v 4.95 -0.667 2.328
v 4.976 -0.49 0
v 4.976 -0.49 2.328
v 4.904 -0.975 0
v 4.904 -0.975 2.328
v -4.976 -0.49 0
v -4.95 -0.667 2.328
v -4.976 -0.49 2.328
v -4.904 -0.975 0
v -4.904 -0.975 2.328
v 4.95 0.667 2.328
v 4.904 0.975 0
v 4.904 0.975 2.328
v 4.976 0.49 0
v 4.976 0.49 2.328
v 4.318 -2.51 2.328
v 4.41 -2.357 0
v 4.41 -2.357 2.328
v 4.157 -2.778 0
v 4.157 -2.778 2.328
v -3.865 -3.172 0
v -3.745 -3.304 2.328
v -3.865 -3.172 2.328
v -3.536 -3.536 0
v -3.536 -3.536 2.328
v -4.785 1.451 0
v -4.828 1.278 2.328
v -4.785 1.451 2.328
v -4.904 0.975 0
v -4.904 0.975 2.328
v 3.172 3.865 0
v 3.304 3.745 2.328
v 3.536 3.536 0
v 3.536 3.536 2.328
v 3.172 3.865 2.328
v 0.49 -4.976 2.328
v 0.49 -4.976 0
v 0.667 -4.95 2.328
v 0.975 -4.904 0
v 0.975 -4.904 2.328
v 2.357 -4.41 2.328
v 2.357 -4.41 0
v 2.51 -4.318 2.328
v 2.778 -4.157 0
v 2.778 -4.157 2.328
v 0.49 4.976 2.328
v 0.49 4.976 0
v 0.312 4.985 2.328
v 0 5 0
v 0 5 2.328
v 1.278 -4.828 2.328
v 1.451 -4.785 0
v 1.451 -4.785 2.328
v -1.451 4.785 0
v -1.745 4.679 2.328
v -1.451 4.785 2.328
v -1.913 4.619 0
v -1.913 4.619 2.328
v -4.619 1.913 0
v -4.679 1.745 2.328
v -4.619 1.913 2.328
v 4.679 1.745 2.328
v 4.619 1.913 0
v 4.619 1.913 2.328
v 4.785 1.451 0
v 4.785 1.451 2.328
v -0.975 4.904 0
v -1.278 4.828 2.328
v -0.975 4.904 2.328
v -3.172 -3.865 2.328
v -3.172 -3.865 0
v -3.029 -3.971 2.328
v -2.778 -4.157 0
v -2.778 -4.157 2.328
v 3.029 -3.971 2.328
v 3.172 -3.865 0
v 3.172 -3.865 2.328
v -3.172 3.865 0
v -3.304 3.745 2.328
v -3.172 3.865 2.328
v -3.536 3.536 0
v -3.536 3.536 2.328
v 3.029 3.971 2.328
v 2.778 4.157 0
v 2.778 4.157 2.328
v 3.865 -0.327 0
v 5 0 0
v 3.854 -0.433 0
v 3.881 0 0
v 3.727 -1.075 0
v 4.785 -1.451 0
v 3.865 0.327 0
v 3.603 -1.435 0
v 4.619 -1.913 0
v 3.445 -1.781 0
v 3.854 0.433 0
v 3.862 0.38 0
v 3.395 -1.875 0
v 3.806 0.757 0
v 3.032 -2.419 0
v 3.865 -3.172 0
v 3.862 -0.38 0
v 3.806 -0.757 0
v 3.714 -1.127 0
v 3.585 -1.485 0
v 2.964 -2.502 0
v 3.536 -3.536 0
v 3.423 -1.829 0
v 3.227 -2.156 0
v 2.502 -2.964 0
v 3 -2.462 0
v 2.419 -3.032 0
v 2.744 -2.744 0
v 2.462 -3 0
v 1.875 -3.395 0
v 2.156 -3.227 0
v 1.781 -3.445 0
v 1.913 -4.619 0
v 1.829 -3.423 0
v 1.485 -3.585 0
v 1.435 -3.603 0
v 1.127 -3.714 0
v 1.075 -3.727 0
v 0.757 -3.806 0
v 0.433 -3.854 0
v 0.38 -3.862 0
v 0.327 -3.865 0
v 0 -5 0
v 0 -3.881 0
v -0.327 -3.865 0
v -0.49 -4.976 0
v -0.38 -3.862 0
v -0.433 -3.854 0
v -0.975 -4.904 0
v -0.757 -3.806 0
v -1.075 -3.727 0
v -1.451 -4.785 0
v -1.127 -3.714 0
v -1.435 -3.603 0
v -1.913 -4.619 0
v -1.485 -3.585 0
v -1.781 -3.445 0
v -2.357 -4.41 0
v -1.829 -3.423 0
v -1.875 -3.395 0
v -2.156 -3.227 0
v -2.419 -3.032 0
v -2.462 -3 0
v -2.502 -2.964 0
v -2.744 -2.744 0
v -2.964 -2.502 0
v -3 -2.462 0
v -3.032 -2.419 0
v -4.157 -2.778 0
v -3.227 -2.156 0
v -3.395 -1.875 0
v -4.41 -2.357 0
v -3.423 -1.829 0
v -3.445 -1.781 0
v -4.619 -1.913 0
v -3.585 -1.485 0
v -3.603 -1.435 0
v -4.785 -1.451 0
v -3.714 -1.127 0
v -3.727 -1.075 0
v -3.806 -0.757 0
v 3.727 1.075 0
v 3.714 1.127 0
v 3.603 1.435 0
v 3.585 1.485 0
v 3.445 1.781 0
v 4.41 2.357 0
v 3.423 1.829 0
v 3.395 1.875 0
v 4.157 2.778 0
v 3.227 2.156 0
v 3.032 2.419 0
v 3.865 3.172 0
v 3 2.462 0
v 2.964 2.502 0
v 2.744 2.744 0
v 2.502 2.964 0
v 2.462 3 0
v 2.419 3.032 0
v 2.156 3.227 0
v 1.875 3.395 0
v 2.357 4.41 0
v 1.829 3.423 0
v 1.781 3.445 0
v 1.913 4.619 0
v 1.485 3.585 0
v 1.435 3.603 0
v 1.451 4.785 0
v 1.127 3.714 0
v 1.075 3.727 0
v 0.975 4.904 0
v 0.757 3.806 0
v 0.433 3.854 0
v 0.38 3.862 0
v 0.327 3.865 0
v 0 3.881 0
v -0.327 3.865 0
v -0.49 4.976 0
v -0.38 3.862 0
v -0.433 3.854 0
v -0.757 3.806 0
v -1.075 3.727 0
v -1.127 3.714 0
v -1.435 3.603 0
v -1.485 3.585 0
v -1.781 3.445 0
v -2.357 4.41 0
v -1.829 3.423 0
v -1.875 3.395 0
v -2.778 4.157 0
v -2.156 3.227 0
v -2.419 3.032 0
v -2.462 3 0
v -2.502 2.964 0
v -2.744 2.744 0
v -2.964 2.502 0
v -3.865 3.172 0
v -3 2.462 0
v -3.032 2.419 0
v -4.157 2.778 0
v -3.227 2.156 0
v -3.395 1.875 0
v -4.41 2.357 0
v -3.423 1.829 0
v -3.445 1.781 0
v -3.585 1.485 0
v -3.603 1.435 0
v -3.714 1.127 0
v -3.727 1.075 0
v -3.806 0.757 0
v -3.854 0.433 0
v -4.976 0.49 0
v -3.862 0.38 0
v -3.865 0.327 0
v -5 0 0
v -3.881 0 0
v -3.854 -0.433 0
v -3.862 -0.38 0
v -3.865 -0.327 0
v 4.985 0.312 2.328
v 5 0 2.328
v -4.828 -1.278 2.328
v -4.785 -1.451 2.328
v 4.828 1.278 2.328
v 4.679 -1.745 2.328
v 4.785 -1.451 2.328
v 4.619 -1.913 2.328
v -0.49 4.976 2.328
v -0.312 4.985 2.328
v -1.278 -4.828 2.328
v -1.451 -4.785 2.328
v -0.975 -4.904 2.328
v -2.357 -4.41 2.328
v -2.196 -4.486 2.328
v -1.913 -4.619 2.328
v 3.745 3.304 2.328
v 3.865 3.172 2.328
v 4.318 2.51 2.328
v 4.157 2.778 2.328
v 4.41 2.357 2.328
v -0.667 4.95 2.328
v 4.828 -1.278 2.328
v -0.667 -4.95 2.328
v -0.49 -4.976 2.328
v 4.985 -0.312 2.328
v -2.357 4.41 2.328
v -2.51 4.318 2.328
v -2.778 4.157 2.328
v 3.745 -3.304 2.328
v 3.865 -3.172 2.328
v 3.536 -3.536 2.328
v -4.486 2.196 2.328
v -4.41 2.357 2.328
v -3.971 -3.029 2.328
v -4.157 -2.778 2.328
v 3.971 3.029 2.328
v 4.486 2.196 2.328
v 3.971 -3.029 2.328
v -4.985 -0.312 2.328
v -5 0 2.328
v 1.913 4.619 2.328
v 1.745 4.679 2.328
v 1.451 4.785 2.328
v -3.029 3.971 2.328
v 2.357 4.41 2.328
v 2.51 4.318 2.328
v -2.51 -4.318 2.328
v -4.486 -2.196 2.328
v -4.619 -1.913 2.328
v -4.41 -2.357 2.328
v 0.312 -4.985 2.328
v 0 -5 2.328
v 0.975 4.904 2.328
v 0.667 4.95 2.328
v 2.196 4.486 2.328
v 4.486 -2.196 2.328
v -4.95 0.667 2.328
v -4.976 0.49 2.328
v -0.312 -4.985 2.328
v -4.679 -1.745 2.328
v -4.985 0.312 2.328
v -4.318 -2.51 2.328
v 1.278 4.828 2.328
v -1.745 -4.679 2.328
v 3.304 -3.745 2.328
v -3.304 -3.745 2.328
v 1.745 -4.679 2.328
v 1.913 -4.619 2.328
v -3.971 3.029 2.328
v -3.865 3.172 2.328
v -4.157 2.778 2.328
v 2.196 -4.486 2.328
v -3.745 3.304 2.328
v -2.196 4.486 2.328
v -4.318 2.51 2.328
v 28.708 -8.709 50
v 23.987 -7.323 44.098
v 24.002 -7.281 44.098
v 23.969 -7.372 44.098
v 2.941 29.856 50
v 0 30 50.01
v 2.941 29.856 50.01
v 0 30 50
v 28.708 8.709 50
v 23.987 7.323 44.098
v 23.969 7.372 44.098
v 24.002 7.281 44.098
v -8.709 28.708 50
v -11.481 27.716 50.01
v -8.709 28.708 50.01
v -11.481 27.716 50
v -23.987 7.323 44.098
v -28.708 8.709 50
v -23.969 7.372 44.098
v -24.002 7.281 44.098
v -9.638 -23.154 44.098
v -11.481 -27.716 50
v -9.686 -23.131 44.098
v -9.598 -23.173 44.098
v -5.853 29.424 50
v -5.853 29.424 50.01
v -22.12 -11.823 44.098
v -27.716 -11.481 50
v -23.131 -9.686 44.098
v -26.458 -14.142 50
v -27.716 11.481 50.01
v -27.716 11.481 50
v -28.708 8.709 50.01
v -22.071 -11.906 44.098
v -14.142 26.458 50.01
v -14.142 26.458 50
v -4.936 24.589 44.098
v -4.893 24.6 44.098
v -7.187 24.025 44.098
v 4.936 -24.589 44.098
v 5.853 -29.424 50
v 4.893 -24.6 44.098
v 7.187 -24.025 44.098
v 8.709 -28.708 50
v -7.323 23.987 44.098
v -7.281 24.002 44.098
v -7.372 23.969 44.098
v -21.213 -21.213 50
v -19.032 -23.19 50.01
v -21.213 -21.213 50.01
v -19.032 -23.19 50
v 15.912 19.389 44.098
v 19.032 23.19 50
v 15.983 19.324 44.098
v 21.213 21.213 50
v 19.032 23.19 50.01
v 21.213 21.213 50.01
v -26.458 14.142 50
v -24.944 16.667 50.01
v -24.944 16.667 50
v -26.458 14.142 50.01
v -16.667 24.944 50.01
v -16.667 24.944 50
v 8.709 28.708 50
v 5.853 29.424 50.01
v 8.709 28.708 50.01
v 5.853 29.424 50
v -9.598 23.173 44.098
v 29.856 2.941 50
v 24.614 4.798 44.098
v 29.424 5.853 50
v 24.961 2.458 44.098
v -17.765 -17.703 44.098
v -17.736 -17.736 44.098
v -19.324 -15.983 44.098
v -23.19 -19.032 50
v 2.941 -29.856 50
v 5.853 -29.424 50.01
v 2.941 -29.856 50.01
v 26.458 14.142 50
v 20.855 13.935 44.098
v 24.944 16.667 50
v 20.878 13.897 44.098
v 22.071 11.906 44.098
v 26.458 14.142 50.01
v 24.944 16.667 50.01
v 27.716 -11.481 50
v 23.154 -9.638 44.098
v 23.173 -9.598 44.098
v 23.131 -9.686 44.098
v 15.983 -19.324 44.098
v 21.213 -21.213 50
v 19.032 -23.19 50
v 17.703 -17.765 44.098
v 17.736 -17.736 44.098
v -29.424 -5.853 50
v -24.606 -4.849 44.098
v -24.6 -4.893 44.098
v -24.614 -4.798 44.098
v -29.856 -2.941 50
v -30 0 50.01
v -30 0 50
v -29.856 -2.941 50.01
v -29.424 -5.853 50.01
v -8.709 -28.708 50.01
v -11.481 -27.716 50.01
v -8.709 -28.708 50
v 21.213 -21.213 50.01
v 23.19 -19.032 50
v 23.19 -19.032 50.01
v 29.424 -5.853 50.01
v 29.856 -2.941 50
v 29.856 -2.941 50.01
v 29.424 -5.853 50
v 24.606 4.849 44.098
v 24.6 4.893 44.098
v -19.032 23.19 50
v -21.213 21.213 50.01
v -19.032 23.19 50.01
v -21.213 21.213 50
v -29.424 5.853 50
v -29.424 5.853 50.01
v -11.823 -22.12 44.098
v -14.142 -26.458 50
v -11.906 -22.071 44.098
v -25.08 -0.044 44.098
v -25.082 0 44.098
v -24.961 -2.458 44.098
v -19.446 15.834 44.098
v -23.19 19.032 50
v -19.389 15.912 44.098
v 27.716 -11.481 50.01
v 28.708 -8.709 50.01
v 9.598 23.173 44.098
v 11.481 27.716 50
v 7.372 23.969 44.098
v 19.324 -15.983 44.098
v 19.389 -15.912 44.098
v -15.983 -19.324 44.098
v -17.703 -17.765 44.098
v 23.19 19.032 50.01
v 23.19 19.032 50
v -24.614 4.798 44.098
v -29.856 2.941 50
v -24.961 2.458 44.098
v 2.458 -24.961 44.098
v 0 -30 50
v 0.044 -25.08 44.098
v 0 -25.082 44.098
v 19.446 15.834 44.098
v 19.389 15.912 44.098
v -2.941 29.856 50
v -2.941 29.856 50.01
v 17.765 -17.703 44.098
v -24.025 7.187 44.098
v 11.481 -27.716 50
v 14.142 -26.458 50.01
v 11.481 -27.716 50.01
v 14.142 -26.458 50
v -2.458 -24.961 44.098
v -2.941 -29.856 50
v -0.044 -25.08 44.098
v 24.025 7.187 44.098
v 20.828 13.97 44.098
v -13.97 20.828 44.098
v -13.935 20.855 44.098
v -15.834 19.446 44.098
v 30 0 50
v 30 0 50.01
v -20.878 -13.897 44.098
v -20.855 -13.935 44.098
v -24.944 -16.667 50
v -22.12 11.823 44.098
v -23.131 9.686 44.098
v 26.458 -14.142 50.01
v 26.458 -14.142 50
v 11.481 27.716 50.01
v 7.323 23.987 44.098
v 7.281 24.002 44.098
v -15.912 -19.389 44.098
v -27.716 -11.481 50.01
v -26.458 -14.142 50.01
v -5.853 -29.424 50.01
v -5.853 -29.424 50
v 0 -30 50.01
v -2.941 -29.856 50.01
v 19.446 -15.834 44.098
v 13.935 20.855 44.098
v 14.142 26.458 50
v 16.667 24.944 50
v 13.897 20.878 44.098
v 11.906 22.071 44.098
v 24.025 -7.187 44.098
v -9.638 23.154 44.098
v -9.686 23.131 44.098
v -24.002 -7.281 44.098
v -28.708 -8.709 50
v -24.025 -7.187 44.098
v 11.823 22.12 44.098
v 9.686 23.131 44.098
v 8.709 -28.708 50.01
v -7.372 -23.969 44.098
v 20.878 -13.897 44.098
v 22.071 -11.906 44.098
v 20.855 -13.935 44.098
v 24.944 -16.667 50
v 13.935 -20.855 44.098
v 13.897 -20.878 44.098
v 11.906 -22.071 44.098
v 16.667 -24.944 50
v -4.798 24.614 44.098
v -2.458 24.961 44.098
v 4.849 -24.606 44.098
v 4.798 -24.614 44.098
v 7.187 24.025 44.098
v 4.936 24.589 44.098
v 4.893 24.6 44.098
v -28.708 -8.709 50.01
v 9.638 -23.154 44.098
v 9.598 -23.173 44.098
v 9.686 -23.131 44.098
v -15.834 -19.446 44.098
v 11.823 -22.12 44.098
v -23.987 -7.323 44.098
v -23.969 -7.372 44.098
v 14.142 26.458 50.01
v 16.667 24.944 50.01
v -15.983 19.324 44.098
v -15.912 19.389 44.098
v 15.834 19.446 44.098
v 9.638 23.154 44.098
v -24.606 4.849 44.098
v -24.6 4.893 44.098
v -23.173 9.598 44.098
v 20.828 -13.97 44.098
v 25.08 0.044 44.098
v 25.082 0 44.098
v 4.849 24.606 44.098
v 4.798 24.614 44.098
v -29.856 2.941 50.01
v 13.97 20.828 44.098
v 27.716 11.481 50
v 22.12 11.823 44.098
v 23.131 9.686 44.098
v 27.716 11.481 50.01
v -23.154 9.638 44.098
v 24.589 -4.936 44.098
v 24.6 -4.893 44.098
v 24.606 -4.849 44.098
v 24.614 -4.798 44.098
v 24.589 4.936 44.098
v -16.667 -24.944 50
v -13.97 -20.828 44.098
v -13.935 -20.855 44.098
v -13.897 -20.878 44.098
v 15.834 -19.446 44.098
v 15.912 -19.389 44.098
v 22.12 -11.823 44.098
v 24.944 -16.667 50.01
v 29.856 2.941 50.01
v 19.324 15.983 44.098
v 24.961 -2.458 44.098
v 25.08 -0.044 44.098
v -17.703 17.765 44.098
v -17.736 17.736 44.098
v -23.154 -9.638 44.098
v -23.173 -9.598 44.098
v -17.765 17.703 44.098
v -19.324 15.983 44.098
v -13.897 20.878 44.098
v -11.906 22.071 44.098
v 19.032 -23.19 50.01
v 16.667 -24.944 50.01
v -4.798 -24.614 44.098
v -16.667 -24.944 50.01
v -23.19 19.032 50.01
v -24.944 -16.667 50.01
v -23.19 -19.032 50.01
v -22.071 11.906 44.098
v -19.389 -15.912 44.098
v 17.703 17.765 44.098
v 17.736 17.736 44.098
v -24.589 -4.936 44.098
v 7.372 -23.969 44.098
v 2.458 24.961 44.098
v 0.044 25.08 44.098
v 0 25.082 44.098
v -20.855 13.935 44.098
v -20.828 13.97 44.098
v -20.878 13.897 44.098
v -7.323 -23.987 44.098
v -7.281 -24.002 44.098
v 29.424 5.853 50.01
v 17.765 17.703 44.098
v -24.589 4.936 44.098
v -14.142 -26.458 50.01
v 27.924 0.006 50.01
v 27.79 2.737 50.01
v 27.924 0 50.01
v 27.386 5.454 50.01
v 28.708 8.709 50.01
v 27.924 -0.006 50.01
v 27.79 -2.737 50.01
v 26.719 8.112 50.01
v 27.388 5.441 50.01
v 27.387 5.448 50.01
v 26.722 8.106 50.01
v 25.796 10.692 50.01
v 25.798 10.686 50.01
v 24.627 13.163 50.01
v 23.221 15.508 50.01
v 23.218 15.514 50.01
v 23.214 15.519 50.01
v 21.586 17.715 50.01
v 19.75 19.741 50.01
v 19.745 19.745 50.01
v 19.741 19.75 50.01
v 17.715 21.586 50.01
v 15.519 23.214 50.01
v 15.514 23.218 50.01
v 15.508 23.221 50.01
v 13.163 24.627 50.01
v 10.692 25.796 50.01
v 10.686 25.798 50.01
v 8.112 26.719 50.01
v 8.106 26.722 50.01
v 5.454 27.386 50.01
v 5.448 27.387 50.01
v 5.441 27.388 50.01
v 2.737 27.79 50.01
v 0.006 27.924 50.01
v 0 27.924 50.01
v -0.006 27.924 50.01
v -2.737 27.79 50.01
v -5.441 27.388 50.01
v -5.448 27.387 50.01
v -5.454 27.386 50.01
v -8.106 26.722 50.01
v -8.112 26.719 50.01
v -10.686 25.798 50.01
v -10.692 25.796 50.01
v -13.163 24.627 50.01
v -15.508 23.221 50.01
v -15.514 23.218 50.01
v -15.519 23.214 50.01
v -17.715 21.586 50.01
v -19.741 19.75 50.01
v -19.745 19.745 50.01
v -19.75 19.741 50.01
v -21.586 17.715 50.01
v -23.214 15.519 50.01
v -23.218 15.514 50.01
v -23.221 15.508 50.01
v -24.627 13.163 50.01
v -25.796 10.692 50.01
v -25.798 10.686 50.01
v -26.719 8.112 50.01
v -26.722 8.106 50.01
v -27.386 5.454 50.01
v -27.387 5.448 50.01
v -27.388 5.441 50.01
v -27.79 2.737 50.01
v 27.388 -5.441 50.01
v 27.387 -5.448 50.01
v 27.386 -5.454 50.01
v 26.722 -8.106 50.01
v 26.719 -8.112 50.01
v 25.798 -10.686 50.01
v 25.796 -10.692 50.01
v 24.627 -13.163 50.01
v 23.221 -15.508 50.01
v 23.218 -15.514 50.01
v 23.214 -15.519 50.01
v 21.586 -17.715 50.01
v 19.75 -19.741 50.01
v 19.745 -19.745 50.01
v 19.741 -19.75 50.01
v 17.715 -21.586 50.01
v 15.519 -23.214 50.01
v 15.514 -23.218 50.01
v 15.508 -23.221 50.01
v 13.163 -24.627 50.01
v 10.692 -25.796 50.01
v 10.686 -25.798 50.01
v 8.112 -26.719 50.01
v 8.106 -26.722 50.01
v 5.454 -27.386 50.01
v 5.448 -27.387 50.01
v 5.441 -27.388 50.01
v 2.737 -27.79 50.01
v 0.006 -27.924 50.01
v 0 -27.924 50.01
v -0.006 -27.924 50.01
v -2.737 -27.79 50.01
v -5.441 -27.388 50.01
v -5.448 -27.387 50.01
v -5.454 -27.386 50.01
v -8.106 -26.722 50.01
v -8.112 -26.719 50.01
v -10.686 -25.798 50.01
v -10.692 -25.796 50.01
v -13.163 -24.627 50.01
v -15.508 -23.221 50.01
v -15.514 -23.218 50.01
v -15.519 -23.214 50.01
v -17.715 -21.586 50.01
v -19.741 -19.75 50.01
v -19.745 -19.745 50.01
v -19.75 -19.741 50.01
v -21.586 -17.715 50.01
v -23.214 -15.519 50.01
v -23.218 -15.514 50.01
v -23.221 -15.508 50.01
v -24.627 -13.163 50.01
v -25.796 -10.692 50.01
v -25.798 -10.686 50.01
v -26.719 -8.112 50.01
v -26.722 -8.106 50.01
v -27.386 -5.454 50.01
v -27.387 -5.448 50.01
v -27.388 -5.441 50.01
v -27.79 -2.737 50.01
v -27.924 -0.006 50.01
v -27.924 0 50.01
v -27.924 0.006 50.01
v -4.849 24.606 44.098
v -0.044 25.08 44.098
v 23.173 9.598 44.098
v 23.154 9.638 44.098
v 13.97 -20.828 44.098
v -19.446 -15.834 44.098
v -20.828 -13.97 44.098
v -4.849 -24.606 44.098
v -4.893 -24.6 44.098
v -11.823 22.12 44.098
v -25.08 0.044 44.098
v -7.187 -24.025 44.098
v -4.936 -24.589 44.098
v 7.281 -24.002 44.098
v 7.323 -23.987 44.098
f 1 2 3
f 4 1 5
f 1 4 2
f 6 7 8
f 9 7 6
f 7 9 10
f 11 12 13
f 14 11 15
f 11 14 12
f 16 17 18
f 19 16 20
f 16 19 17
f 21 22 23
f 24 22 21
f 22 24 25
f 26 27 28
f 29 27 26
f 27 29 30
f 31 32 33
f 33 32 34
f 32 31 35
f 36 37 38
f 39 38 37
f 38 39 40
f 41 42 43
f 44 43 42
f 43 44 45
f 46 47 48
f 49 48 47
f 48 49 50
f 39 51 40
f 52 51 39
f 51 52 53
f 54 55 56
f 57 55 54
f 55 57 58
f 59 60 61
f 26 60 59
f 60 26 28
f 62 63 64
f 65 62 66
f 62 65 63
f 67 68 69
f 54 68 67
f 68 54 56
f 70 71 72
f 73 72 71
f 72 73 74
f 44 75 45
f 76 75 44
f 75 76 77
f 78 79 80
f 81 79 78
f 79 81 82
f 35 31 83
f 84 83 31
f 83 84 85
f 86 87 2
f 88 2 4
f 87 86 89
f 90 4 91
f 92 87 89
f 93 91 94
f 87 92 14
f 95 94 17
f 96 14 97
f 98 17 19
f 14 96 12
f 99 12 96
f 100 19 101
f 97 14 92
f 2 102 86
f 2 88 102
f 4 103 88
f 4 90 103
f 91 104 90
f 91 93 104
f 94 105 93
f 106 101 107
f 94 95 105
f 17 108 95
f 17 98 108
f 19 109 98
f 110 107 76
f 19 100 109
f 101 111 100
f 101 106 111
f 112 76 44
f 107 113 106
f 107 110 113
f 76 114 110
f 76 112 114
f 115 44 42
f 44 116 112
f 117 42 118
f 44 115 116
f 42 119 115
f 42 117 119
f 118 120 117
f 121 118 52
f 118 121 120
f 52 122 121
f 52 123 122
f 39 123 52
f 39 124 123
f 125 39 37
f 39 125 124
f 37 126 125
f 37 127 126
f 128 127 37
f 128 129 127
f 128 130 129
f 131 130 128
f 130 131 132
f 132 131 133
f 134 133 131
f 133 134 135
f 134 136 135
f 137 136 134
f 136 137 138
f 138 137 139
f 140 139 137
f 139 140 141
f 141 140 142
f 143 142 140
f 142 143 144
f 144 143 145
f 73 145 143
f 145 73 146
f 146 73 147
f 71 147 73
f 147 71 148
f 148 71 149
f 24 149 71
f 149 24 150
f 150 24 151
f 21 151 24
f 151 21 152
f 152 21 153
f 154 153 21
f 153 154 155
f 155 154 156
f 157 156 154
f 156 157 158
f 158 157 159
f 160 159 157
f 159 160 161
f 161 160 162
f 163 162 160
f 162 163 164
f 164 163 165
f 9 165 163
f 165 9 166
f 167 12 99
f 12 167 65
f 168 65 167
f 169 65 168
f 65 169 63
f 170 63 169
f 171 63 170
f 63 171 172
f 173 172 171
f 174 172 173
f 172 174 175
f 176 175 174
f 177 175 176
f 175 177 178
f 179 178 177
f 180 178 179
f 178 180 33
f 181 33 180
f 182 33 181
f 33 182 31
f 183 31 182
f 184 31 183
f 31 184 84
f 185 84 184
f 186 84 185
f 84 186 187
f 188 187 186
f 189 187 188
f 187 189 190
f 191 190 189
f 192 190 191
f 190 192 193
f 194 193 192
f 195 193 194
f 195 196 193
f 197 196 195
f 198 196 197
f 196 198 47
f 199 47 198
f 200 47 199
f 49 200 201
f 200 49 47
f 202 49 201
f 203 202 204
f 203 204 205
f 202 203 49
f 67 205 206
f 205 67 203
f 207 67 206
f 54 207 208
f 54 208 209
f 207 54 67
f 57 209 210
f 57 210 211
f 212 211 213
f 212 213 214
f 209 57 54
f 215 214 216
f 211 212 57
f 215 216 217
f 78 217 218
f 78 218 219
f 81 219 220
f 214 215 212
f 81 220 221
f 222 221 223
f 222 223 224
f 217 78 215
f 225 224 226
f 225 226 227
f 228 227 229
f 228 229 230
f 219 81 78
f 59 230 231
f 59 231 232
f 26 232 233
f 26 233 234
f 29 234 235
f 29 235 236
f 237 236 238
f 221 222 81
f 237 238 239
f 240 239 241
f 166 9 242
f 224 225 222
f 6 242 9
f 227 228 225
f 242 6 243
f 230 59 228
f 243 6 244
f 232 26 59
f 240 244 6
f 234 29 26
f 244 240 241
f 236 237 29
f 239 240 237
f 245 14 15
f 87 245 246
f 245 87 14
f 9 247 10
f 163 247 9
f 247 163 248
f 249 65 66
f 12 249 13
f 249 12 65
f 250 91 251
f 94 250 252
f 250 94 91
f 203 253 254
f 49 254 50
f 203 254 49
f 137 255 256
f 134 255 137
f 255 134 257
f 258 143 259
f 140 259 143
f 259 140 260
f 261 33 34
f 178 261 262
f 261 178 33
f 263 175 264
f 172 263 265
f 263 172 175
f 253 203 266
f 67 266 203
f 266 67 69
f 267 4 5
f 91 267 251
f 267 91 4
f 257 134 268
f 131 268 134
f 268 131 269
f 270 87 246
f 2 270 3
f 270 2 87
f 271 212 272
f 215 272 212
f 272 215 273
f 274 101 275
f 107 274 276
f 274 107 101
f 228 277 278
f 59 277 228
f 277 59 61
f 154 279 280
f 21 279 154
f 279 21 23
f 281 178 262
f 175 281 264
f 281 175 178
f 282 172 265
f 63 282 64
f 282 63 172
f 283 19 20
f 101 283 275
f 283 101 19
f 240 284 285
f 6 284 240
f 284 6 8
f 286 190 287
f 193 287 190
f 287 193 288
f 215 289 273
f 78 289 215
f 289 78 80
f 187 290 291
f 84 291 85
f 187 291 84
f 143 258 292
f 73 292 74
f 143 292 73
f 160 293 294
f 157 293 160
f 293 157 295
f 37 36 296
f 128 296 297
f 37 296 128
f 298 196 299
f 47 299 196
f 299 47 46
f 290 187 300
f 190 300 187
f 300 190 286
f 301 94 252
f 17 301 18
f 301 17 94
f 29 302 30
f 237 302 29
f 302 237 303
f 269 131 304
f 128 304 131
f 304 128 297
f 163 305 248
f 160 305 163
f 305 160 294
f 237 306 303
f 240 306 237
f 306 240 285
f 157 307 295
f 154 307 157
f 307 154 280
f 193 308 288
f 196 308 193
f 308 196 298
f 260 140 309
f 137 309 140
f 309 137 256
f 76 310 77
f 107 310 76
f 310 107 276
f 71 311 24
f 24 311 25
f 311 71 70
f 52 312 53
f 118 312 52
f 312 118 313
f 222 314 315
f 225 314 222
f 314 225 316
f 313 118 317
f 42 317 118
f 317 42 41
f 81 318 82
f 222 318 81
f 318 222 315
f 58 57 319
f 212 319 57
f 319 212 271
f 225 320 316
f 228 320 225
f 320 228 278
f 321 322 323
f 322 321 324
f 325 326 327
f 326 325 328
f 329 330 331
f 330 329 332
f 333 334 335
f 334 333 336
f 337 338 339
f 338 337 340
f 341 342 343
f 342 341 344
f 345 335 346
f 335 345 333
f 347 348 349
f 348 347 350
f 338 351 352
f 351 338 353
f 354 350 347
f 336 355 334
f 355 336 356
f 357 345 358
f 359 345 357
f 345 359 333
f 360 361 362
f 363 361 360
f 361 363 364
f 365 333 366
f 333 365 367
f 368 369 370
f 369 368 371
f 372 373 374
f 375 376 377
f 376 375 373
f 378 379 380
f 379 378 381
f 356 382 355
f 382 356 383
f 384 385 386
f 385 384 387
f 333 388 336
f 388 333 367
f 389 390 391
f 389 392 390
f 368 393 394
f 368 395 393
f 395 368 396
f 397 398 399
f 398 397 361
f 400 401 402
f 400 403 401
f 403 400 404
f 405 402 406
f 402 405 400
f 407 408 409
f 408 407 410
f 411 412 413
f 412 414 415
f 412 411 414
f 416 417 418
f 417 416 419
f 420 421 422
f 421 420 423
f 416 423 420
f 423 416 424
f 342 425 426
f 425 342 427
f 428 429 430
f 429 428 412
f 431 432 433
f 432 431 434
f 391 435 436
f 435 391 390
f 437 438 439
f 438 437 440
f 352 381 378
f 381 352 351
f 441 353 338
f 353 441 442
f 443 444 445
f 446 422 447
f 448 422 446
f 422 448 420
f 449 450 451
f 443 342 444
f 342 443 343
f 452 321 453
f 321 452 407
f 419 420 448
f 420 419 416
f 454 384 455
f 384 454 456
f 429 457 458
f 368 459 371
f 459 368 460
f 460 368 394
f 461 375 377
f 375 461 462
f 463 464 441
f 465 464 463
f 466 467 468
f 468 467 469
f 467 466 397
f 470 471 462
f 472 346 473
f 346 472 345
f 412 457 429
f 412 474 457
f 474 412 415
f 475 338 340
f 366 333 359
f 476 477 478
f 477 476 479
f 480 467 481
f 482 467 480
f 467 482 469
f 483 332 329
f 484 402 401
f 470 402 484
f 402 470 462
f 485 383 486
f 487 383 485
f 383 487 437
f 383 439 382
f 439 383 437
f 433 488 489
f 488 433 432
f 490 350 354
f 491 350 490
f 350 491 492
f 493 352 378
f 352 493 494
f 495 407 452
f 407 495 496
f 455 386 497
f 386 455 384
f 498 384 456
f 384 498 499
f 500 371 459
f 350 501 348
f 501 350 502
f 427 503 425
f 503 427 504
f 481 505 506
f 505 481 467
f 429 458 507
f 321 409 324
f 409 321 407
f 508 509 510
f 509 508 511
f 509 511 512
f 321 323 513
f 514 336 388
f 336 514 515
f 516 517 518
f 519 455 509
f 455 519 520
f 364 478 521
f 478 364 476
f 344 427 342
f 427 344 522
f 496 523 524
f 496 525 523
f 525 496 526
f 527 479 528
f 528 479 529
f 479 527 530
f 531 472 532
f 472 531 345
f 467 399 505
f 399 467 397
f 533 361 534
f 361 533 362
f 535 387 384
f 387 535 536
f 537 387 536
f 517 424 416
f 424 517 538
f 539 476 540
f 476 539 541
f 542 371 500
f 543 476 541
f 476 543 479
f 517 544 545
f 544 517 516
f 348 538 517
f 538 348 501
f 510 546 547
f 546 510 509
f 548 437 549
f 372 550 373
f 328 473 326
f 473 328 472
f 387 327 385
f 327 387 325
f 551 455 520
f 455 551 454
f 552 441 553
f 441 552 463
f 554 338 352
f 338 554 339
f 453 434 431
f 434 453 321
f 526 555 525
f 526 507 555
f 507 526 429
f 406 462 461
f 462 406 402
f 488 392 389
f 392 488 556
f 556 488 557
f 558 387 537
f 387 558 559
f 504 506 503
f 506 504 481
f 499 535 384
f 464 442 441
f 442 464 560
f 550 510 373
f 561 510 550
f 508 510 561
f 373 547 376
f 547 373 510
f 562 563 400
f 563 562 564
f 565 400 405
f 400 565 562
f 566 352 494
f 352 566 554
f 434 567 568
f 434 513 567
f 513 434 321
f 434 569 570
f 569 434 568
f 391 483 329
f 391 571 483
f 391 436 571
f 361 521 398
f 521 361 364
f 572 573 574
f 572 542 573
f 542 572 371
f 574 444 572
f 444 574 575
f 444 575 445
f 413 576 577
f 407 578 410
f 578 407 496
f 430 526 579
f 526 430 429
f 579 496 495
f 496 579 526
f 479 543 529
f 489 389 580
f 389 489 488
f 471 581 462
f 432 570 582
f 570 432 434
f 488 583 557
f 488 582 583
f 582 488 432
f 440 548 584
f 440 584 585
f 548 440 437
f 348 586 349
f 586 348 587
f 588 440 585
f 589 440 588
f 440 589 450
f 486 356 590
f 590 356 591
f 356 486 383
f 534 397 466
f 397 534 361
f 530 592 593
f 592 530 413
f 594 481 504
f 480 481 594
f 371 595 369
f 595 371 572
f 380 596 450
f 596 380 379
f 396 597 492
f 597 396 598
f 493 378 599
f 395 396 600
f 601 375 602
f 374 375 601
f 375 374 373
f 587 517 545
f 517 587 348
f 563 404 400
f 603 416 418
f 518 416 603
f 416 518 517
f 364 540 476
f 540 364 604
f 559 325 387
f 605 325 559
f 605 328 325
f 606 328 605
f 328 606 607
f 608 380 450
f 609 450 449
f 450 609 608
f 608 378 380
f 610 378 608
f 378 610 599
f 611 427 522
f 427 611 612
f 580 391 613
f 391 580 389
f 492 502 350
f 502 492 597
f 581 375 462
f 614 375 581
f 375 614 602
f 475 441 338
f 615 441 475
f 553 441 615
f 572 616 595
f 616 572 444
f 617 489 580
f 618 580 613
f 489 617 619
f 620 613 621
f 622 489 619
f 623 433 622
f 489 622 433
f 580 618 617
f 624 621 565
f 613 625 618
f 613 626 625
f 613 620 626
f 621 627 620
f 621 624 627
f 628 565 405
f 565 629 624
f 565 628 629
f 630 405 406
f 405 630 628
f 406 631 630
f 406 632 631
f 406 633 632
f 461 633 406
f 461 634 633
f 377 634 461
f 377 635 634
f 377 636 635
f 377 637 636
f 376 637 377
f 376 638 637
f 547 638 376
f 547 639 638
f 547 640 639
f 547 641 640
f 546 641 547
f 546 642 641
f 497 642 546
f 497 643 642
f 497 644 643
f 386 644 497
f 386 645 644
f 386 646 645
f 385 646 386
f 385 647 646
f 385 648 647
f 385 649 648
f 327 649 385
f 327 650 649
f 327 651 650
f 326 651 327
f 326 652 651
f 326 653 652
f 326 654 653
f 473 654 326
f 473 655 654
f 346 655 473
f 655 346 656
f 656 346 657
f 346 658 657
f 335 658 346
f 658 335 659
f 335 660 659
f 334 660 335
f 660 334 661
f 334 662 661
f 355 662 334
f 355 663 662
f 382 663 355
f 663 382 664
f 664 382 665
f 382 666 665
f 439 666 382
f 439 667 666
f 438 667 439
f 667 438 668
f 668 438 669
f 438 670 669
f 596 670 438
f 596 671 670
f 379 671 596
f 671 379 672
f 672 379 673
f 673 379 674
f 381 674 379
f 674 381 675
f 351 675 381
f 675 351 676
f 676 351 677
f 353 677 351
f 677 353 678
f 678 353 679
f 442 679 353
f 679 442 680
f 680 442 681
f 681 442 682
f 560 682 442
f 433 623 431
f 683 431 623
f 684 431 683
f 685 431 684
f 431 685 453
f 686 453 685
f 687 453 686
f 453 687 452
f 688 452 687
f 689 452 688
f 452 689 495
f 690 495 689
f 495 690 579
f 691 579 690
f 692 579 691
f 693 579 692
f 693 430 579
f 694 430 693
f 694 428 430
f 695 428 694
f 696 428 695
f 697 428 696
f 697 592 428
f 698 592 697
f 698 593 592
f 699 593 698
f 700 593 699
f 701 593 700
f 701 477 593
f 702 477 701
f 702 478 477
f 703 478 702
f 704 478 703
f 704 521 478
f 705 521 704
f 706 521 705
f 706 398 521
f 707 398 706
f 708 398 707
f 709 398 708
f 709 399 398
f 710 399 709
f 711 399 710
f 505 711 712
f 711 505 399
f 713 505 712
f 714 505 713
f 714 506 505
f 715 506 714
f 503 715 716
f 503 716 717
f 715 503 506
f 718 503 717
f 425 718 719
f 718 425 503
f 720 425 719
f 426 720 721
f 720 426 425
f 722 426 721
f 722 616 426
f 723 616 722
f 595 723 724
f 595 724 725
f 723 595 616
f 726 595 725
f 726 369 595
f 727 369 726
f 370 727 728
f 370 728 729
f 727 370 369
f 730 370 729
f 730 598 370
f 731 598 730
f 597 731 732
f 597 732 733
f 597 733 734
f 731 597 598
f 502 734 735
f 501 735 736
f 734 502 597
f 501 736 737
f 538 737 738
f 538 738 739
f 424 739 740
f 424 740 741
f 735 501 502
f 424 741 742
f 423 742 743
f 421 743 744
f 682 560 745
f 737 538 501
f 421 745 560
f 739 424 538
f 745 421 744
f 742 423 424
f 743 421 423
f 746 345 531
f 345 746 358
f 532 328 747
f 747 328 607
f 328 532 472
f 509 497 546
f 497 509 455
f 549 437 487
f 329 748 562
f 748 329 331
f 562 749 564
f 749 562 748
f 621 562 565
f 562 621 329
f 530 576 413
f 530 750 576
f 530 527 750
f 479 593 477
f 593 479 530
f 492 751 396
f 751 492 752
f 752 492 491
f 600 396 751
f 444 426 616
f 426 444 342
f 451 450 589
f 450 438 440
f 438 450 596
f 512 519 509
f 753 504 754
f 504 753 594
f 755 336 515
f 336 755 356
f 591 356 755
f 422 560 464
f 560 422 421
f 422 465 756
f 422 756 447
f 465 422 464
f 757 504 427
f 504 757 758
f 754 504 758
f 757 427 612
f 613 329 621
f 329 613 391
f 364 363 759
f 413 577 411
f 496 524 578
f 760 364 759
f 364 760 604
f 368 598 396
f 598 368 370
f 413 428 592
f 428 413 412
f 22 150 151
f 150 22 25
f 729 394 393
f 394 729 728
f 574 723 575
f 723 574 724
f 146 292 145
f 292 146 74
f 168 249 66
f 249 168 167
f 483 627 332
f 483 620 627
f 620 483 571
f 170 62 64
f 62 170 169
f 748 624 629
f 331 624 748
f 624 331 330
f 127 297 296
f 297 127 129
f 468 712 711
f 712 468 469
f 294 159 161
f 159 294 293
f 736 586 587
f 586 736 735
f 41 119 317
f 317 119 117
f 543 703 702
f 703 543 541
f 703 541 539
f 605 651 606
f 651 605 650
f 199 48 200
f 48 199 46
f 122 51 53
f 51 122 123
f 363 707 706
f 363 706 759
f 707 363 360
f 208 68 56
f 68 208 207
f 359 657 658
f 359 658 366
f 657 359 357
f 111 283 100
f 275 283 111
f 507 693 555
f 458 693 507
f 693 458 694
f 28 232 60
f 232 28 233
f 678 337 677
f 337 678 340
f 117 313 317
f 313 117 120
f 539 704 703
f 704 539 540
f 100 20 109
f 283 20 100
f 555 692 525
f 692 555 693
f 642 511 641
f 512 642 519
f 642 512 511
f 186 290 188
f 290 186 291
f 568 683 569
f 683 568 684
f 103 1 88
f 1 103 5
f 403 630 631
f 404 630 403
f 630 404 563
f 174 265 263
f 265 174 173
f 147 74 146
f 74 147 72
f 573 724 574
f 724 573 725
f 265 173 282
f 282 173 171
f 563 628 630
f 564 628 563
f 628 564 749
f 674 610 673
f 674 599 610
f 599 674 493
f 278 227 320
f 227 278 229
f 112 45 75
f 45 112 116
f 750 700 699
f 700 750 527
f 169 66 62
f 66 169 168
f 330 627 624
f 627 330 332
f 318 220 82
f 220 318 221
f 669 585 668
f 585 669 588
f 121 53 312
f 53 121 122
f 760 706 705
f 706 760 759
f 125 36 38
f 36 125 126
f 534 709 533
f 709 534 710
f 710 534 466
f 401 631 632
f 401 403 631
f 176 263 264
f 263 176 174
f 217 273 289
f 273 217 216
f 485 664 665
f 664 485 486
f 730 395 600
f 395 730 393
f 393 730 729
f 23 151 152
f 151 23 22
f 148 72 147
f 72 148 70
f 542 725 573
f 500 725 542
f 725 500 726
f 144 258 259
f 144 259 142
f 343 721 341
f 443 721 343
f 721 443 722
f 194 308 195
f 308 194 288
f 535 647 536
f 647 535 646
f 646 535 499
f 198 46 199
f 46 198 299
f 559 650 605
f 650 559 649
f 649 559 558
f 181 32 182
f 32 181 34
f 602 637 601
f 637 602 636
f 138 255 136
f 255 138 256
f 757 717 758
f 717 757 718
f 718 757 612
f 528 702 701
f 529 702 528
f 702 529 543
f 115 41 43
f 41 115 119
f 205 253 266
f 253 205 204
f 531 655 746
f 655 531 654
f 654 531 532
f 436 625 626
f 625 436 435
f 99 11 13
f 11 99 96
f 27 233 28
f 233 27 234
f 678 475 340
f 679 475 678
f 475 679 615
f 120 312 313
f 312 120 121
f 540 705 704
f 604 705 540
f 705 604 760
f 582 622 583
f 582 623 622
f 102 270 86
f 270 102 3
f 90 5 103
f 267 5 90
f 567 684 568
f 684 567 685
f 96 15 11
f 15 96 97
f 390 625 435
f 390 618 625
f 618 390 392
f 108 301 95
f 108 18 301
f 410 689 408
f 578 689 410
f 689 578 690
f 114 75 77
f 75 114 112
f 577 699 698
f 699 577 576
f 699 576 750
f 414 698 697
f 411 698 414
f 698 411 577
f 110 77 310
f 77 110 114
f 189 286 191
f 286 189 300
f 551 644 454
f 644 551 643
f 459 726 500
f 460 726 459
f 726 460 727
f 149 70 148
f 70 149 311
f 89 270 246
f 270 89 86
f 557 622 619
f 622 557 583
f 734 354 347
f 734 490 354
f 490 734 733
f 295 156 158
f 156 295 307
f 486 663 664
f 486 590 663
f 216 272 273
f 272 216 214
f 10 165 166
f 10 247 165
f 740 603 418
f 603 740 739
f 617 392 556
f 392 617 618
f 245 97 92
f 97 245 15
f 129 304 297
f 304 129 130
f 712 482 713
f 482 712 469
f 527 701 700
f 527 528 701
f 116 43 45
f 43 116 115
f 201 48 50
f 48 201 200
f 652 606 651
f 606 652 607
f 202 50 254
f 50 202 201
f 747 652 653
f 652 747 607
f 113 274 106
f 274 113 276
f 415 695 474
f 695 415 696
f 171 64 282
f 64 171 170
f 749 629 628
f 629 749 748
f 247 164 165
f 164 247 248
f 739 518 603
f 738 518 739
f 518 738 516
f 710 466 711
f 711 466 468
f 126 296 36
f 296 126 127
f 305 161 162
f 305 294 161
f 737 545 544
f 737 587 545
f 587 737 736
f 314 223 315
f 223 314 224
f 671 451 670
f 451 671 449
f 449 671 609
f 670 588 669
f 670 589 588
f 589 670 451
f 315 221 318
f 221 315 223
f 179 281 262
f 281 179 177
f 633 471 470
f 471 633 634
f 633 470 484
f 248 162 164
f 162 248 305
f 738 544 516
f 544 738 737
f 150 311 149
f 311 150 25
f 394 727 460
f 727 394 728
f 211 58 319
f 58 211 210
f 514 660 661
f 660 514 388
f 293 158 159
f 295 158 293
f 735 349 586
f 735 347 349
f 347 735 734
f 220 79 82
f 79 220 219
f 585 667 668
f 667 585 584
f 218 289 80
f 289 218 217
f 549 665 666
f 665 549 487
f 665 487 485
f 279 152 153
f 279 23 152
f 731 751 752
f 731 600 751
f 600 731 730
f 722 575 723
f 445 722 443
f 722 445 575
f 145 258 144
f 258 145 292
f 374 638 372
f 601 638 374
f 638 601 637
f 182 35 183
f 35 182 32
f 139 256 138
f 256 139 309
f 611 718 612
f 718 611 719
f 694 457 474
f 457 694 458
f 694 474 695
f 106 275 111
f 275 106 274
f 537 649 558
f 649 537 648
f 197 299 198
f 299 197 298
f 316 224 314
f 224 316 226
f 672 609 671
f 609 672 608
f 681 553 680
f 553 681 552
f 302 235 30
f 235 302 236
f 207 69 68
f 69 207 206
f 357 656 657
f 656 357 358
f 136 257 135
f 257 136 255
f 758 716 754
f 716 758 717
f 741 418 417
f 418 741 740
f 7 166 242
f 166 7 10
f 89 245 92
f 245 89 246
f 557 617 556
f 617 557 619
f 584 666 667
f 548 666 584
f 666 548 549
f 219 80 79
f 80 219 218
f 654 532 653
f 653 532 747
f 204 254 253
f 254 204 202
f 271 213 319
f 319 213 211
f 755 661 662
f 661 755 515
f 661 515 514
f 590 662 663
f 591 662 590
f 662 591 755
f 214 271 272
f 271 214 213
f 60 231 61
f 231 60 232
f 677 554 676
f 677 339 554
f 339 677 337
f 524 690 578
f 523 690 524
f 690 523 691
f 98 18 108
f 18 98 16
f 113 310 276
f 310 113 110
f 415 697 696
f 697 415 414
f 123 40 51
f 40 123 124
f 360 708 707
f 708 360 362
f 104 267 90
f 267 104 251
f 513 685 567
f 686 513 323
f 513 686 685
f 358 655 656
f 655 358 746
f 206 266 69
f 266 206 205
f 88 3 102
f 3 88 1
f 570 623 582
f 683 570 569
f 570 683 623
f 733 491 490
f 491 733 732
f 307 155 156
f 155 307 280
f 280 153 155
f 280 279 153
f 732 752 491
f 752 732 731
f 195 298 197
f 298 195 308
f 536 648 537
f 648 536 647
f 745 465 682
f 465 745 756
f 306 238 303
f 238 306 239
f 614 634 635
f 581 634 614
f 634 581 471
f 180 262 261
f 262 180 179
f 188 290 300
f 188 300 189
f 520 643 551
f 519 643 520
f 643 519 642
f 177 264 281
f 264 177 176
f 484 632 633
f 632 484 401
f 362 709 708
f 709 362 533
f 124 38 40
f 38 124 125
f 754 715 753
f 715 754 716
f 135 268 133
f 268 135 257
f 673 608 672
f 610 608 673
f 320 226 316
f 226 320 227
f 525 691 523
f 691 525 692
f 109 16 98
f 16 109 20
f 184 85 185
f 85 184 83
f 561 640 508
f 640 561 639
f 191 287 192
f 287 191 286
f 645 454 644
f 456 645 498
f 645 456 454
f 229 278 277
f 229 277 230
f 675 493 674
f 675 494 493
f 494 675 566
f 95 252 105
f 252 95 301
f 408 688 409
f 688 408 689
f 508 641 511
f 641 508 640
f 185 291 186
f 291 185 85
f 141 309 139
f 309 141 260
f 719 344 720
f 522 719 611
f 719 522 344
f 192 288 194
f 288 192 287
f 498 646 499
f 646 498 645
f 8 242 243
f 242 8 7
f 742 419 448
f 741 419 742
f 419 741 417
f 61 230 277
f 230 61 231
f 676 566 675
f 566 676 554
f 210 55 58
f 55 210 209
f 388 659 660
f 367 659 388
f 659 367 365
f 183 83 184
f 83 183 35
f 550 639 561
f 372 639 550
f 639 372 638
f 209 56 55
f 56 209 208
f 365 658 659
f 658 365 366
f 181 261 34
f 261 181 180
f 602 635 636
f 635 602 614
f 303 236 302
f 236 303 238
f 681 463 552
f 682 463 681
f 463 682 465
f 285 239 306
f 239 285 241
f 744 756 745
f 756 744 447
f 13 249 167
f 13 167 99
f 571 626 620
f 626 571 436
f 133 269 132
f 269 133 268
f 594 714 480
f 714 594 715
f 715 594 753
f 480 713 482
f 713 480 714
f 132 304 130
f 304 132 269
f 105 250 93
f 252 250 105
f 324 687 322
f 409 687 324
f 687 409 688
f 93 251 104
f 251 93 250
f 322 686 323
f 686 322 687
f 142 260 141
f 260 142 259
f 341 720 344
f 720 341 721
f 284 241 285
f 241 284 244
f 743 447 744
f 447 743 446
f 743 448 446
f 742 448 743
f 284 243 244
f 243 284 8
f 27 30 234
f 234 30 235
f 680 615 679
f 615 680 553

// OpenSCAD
// Lab Funnel Design - Corrected
// Units: mm
// Print Orientation: Upright (Base at Z=0)

// --- Dimensions ---
spout_outer_diameter = 10.0;      // Outer diameter of the spout
spout_height = 20.0;             // Height of the spout (from Z=0 to Z=20)
funnel_rim_diameter = 60.0;      // Outer diameter at the top rim
funnel_height = 50.0;            // Total height from base to rim
wall_thickness = 1.6;            // Constant wall thickness
$fn = 64;                        // Smoothness for curves

// --- Calculated Dimensions ---
spout_inner_diameter = spout_outer_diameter - (2 * wall_thickness);
funnel_inner_rim_diameter = funnel_rim_diameter - (2 * wall_thickness);

// --- Main Construction ---

// We use a single difference to ensure a single watertight manifold body
difference() {
    // 1. The Outer Shell
    union() {
        // The Spout (Cylinder)
        cylinder(h = spout_height, d = spout_outer_diameter);
        
        // The Funnel Cone
        hull() {
            // Bottom of cone (at Z=20)
            translate([0, 0, spout_height])
                cylinder(h = 0.01, d = spout_outer_diameter);
            
            // Top of cone (at Z=50)
            translate([0, 0, funnel_height])
                cylinder(h = 0.01, d = funnel_rim_diameter);
        }
    }

    // 2. The Inner Bore (The "Hole")
    // We subtract a single continuous internal volume to ensure 
    // the spout and cone are perfectly connected and hollowed.
    union() {
        // Spout bore (extends below Z=0 to ensure clean cut)
        translate([0, 0, -1])
            cylinder(h = spout_height + 1, d = spout_inner_diameter);
        
        // Funnel bore (extends above Z=50 to ensure clean cut)
        hull() {
            // Bottom of inner cone (at Z=0 to ensure it cuts through the spout)
            translate([0, 0, -1])
                cylinder(h = 0.01, d = spout_inner_diameter);
            
            // Top of inner cone (at Z=50 to ensure it cuts through the rim)
            translate([0, 0, funnel_height + 1])
                cylinder(h = 1, d = funnel_inner_rim_diameter);
        }
    }
}

// Verification of logic:
// - Spout OD: 10mm (Matches spec)
// - Spout ID: 10 - (2*1.6) = 6.8mm (Matches spec)
// - Funnel Rim OD: 60mm (Matches spec)
// - Funnel Rim ID: 60 - (2*1.6) = 56.8mm (Matches spec)
// - Total Height: 50mm (Matches spec)
// - Wall thickness: 1.6mm constant (Matches spec)
